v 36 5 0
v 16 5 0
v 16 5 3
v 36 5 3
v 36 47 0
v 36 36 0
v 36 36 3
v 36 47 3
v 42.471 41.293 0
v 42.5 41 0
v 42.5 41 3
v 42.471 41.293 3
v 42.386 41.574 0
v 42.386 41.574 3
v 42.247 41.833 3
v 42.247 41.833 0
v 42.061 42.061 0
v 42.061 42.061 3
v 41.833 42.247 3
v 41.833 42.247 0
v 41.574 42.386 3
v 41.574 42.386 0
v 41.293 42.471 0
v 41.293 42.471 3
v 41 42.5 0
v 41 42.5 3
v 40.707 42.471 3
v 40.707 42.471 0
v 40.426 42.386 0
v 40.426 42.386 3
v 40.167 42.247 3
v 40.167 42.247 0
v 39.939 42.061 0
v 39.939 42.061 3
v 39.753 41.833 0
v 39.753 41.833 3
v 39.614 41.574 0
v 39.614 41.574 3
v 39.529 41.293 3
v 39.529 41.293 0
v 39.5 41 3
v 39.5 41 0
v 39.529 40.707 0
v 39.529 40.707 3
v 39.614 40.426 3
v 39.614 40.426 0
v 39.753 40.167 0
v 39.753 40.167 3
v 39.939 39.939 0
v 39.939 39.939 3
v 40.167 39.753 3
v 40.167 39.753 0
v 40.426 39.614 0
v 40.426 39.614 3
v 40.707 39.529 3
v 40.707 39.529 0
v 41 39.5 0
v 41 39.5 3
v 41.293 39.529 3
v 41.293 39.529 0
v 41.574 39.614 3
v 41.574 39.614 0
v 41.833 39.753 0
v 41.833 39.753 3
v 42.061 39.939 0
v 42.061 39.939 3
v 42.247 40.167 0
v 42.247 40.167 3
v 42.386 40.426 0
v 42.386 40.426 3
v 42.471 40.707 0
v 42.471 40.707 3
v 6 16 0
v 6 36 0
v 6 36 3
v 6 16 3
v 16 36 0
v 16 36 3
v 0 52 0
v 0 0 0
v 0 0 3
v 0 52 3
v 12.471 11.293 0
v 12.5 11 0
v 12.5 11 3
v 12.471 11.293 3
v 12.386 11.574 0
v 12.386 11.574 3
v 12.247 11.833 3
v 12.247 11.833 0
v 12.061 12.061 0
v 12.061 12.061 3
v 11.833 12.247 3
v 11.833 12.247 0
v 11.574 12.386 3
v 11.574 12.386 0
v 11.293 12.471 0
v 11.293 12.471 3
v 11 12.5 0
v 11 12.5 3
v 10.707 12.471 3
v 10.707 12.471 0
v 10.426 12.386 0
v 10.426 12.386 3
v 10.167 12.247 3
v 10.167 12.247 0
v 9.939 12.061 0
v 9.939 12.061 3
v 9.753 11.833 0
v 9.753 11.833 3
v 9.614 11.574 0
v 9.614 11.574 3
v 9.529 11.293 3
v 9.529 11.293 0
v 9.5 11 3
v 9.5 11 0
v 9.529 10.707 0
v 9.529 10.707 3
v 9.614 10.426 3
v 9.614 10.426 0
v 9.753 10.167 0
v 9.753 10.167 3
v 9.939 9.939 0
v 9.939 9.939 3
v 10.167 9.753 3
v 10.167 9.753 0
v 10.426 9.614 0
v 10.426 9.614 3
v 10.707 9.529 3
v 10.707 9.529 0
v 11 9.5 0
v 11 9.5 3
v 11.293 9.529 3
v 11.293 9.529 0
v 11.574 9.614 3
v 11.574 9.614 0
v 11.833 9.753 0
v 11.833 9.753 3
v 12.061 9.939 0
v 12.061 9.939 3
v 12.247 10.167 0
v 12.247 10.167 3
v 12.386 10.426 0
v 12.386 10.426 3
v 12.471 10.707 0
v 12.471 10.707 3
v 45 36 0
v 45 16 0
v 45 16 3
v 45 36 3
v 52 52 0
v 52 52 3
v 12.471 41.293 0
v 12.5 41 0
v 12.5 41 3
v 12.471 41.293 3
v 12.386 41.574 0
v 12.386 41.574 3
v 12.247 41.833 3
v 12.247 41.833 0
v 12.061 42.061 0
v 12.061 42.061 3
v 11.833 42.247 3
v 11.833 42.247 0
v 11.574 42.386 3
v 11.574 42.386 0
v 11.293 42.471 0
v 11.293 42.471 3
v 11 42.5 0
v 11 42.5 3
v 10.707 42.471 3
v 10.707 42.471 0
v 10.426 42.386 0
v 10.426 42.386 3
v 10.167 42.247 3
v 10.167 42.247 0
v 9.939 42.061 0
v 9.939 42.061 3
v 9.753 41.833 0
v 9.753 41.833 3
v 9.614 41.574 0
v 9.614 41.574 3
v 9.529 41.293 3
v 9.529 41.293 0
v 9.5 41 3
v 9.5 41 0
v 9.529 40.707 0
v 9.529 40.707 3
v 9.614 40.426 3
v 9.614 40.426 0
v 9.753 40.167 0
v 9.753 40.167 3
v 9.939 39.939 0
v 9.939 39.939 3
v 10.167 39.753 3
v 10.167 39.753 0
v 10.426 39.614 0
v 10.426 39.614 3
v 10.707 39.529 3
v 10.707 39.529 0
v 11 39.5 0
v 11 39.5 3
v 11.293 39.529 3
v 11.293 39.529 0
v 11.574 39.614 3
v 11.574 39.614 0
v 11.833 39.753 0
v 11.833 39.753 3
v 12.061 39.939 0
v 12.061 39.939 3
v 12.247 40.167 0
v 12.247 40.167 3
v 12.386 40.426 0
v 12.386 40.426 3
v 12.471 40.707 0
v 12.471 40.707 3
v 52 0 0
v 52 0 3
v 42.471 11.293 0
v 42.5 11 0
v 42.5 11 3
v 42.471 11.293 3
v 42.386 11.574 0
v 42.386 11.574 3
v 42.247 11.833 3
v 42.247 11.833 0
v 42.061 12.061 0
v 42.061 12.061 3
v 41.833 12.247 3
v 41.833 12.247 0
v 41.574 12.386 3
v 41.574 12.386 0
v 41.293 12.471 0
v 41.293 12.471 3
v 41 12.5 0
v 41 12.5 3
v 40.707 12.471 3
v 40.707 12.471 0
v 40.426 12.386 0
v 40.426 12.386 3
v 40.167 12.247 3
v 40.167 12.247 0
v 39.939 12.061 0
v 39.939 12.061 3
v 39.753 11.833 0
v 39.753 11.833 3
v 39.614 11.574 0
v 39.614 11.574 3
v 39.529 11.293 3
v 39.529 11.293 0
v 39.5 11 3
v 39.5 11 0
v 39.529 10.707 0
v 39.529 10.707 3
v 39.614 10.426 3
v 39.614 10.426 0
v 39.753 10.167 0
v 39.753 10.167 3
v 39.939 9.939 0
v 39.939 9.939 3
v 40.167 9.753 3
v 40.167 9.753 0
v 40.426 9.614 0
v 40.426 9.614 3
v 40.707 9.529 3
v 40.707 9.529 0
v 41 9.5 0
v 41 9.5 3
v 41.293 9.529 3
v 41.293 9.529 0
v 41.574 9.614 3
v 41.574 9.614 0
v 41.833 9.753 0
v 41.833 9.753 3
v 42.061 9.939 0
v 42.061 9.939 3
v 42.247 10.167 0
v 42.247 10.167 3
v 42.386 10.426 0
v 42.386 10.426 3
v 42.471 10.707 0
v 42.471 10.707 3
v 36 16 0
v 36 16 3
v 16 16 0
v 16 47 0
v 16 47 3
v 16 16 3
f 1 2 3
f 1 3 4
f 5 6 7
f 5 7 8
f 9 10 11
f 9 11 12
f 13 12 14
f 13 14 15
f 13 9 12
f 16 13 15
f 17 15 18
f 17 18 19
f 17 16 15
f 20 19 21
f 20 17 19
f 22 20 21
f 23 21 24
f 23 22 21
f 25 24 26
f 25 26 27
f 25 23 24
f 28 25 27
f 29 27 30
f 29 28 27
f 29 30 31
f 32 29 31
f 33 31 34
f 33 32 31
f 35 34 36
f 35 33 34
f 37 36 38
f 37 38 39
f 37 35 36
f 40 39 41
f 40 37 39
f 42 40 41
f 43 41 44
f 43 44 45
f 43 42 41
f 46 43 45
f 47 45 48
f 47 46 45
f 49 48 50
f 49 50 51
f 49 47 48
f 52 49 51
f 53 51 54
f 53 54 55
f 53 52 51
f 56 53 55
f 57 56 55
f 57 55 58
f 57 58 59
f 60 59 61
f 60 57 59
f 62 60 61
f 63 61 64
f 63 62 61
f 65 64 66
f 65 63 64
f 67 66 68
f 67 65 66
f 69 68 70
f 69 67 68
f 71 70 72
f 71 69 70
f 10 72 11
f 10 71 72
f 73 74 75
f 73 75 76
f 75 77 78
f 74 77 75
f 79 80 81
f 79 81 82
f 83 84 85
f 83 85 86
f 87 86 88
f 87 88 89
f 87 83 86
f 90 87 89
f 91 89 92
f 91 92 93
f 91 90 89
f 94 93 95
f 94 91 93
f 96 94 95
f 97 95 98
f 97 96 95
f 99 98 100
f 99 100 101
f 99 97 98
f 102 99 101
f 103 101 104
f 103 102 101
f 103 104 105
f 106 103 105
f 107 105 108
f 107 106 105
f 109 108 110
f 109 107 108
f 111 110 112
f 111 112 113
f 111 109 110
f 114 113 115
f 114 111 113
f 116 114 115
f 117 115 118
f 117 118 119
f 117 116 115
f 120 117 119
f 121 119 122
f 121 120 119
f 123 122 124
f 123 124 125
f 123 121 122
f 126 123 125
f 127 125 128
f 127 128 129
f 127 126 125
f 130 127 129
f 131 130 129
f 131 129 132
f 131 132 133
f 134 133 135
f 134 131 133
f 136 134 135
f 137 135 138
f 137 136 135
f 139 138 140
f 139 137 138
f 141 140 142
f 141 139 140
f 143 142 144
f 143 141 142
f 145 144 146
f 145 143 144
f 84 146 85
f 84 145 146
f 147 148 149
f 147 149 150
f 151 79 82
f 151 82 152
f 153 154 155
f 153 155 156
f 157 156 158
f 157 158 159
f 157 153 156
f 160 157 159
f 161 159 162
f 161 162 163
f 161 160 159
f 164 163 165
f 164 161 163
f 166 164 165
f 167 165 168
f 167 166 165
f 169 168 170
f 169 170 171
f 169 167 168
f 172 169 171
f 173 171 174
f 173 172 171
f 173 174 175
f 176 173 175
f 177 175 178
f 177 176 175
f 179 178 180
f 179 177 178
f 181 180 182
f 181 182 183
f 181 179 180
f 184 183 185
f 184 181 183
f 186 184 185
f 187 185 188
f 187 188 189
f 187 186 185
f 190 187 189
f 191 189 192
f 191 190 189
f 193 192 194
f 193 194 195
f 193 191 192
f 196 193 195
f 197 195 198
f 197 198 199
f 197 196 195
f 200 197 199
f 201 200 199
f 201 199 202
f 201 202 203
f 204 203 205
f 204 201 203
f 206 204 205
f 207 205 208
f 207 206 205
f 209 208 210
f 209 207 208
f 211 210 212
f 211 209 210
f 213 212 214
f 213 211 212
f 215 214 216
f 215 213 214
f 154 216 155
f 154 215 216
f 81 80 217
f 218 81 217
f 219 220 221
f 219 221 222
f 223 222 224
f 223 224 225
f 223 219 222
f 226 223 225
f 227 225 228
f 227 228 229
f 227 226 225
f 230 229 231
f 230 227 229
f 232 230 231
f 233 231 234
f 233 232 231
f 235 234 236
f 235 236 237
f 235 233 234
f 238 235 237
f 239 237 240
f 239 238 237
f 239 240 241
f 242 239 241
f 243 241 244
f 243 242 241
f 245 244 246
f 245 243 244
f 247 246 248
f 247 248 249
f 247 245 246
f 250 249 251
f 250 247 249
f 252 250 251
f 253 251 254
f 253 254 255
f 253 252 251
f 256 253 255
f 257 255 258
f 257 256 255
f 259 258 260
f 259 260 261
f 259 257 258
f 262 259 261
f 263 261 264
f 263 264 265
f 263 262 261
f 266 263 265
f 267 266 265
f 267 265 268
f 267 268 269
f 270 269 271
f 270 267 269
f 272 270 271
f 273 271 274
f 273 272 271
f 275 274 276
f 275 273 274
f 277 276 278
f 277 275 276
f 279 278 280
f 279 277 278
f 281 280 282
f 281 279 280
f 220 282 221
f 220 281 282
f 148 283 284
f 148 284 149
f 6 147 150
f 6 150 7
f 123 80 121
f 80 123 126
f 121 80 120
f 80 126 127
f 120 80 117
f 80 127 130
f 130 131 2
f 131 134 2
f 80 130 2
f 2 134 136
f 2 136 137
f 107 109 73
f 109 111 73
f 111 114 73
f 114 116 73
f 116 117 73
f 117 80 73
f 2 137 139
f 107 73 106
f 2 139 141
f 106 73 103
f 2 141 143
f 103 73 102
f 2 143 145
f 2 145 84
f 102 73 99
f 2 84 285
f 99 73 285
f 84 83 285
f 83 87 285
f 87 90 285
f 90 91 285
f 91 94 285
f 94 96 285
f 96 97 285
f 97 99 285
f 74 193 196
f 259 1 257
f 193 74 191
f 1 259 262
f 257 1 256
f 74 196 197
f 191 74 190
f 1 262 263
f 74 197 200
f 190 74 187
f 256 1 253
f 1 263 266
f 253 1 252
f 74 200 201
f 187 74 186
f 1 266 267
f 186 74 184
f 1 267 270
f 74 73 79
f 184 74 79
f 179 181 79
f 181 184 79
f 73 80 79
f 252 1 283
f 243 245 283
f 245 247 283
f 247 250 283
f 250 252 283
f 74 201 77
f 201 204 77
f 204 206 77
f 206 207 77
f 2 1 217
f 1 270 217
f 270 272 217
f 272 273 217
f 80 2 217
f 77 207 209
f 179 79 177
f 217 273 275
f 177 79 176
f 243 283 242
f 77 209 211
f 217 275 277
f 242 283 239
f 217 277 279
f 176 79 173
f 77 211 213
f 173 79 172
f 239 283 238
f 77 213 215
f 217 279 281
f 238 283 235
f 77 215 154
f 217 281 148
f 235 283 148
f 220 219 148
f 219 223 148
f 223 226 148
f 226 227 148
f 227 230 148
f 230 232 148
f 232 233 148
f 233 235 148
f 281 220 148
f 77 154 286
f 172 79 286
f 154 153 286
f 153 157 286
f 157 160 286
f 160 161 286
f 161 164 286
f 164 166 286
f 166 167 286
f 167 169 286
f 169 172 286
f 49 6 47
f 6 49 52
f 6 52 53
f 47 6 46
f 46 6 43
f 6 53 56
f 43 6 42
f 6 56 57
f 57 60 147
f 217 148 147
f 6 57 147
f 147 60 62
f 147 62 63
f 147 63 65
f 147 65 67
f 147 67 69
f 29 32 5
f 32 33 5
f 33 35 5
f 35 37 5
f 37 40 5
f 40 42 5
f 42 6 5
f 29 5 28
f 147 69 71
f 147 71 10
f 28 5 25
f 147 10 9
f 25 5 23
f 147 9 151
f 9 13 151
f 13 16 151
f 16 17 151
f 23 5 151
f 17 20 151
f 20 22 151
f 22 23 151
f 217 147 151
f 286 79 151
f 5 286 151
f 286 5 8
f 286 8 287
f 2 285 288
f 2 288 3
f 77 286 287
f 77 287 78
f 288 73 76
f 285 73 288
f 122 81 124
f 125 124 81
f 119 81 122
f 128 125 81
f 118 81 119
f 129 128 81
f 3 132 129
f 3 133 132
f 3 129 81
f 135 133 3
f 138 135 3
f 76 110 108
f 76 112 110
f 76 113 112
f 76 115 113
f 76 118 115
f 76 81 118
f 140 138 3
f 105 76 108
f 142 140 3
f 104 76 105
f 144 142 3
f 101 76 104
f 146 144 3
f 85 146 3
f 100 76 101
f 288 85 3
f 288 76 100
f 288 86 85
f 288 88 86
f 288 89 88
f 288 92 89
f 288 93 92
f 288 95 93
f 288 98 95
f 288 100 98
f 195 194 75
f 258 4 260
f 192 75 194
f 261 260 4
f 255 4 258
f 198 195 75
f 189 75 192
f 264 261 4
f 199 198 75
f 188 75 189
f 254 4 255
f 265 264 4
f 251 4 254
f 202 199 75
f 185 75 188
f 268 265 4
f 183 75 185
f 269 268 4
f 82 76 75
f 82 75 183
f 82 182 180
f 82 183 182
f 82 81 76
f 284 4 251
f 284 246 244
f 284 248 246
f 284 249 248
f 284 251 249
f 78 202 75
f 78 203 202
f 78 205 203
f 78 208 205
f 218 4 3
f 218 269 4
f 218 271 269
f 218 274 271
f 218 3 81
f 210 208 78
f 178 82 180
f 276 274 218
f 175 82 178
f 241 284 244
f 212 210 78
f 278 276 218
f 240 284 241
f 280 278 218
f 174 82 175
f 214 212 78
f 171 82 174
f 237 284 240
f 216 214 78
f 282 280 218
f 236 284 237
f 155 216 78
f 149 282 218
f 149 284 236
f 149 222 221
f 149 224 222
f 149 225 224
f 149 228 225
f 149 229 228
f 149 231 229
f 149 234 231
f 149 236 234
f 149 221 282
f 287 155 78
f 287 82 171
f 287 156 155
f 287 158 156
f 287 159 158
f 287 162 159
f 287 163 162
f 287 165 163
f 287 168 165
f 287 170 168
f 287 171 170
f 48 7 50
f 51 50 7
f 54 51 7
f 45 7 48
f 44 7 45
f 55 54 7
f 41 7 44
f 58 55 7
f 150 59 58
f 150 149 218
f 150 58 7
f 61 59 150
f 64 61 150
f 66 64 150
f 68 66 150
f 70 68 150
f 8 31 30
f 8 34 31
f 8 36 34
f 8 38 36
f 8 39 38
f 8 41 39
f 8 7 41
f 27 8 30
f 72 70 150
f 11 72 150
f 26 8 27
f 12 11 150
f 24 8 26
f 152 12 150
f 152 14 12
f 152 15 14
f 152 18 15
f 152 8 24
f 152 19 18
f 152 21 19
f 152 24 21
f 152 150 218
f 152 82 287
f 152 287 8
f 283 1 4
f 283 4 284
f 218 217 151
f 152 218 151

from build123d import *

# Parameters (mm, degrees)
MODEL_W                 = 52
MODEL_H                 = 52
MODEL_R                 = 1.5
SALIENTE_EXTRUIR1_DEPTH = 3


with BuildPart() as part:
    # Model → Saliente-Extruir1 (new body)
    with BuildSketch(Plane.XY):
        with Locations((26, 26)):
            Rectangle(MODEL_W, MODEL_H)
        with Locations((41, 41)):
            Circle(MODEL_R, mode=Mode.SUBTRACT)
        with Locations((41, 11)):
            Circle(MODEL_R, mode=Mode.SUBTRACT)
        with Locations((11, 11)):
            Circle(MODEL_R, mode=Mode.SUBTRACT)
        with Locations((11, 41)):
            Circle(MODEL_R, mode=Mode.SUBTRACT)
        Polygon((36, 16), (45, 16), (45, 36), (36, 36), (36, 47), (16, 47), (16, 36), (6, 36), (6, 16), (16, 16), (16, 5), (36, 5), align=None, mode=Mode.SUBTRACT)
    extrude(amount=SALIENTE_EXTRUIR1_DEPTH)


solid = part.part
